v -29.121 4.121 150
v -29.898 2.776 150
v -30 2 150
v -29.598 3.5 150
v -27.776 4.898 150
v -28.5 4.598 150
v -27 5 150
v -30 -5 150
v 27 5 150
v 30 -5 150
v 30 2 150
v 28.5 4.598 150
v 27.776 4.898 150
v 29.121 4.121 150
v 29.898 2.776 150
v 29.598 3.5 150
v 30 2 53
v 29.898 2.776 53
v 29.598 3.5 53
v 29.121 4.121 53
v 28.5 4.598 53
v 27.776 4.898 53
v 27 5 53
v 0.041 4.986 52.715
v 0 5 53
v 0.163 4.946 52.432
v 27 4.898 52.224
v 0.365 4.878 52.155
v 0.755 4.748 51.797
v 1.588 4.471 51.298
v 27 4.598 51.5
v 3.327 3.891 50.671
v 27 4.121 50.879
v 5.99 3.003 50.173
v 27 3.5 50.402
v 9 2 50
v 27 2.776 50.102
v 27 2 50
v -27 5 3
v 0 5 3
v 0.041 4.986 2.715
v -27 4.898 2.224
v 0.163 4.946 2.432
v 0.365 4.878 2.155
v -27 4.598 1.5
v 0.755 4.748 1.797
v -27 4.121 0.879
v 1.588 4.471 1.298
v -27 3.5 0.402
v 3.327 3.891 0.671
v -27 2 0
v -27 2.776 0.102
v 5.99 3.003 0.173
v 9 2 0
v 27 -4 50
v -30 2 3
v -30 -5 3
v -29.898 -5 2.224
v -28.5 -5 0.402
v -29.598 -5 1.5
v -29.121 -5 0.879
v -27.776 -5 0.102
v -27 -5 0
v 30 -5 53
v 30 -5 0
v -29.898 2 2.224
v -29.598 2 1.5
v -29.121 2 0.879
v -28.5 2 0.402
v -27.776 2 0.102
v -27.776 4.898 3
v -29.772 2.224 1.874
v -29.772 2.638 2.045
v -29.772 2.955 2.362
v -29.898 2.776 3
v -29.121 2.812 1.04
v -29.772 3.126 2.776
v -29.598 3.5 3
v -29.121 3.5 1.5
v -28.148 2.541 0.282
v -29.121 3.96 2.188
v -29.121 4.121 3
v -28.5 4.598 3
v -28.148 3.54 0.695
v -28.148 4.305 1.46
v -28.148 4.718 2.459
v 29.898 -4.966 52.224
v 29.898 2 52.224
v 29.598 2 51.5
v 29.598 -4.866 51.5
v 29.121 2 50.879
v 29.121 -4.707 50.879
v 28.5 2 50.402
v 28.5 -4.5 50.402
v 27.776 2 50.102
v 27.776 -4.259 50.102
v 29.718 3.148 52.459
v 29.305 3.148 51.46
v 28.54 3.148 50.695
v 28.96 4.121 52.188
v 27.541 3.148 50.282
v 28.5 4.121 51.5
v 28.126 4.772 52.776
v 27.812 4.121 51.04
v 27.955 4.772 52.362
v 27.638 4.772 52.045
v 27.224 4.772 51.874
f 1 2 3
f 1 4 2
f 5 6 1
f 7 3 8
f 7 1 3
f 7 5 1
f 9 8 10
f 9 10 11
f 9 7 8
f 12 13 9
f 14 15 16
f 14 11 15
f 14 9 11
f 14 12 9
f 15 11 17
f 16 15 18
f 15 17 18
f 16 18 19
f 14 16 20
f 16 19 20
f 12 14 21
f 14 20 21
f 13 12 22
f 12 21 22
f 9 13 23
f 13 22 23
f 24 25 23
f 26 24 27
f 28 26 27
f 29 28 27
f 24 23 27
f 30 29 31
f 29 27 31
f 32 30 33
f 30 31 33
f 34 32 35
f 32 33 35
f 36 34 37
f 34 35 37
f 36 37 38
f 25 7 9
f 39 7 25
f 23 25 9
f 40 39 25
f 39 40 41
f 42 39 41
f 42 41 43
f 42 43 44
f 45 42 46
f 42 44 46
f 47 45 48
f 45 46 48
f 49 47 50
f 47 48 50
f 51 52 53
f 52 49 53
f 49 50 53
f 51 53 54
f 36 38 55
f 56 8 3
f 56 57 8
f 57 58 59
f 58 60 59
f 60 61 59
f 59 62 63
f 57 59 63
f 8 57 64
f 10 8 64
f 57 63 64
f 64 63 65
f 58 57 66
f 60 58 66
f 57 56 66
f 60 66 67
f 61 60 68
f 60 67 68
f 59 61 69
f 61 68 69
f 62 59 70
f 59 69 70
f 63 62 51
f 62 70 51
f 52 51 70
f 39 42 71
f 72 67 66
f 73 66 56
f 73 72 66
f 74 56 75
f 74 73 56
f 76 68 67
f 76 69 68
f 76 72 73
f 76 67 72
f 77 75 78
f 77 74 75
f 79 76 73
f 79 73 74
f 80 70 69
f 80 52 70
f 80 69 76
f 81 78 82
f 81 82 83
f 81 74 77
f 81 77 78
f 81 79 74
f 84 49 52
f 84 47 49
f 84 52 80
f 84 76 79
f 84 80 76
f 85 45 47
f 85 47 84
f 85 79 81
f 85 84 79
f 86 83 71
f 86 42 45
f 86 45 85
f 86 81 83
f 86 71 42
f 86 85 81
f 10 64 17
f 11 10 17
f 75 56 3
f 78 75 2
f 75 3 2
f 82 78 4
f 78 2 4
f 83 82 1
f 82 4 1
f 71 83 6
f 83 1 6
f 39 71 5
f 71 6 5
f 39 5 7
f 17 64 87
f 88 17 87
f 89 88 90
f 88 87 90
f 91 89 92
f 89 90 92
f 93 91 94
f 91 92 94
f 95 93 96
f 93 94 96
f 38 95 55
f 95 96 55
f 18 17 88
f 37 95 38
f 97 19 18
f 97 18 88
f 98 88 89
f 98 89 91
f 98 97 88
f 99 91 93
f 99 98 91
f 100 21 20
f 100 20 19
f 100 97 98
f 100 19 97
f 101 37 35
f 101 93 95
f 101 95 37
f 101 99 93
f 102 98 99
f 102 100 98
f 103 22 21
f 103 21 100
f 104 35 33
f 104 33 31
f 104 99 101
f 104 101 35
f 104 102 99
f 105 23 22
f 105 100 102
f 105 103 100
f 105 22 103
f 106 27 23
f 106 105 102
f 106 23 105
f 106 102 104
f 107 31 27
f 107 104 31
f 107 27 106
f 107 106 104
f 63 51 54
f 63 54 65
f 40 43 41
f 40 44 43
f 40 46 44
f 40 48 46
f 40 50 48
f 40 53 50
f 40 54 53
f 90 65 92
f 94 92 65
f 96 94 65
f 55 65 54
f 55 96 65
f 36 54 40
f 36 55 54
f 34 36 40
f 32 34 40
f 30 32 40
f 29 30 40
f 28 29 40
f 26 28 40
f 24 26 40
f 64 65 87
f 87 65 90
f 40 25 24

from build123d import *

# Parameters (mm, degrees)
SKETCH1_W               = 60
SKETCH1_H               = 10
BOSS_EXTRUDE1_DEPTH     = 150
CUT_EXTRUDE3_DEPTH      = 154.05227865
CUT_EXTRUDE3_DEPTH_BACK = 50
FILLET5_R               = 3
FILLET6_R               = 3
FILLET7_R               = 3


with BuildPart() as part:
    # Sketch1 → Boss-Extrude1 (new body)
    with BuildSketch(Plane.XY):
        Rectangle(SKETCH1_W, SKETCH1_H)
    extrude(amount=BOSS_EXTRUDE1_DEPTH)

    # Sketch2 → Cut-Extrude3 (cut, two sides: drawn at the far end of the back side and taken through both)
    with BuildSketch(Plane(origin=(0, 0, 0), x_dir=(-1, 0, 0), z_dir=(0, 0, -1)).offset(-CUT_EXTRUDE3_DEPTH_BACK)):
        Polygon((-30, 5), (-30, -5), (0, 5), align=None)
    extrude(amount=CUT_EXTRUDE3_DEPTH + CUT_EXTRUDE3_DEPTH_BACK, mode=Mode.SUBTRACT)

    # Fillet5
    fillet5_edges = [part.edges().sort_by_distance(p)[0] for p in [
        (15, 5, 50),
        (30, 0, 50),
        (-15, 5, 0),
    ]]
    fillet(fillet5_edges, radius=FILLET5_R)

    # Fillet6
    fillet6_edges = [part.edges().sort_by_distance(p)[0] for p in [
        (-30, -1.5, 0),
        (-30, 4.121320344, 0.878679656),
        (-30, 5, 76.5),
    ]]
    fillet(fillet6_edges, radius=FILLET6_R)

    # Fillet7
    # the kernel refuses this fillet: 3 mm, written as the material it takes off along each edge
    with BuildSketch(Plane(origin=(27, 2, 53), x_dir=(1, 0, 0), z_dir=(0, 1, 0))) as fillet7_piece_1_section:
        Polygon((0, 0), (FILLET7_R, 0), (FILLET7_R, FILLET7_R), (0, FILLET7_R), align=None)
    fillet7_piece_1 = extrude(amount=FILLET7_R, mode=Mode.PRIVATE)
    fillet7_piece_1 = fillet7_piece_1 - Plane(origin=(27, 2, 53), x_dir=(-0.7071067811865475, 0, 0.7071067811865475), z_dir=(0, 1, 0)) * Sphere(FILLET7_R, mode=Mode.PRIVATE)
    add(fillet7_piece_1, mode=Mode.SUBTRACT)
    with BuildSketch(Plane(origin=(30, 5, 53), x_dir=(-1, 0, 0), z_dir=(0, 0, 1))) as fillet7_piece_2:
        with BuildLine():
            CenterArc((FILLET7_R, FILLET7_R), FILLET7_R, 180, 90)
            Line((0, FILLET7_R), (0, 0))
            Line((0, 0), (FILLET7_R, 0))
        make_face()
    extrude(amount=104.5, mode=Mode.SUBTRACT)


solid = part.part
